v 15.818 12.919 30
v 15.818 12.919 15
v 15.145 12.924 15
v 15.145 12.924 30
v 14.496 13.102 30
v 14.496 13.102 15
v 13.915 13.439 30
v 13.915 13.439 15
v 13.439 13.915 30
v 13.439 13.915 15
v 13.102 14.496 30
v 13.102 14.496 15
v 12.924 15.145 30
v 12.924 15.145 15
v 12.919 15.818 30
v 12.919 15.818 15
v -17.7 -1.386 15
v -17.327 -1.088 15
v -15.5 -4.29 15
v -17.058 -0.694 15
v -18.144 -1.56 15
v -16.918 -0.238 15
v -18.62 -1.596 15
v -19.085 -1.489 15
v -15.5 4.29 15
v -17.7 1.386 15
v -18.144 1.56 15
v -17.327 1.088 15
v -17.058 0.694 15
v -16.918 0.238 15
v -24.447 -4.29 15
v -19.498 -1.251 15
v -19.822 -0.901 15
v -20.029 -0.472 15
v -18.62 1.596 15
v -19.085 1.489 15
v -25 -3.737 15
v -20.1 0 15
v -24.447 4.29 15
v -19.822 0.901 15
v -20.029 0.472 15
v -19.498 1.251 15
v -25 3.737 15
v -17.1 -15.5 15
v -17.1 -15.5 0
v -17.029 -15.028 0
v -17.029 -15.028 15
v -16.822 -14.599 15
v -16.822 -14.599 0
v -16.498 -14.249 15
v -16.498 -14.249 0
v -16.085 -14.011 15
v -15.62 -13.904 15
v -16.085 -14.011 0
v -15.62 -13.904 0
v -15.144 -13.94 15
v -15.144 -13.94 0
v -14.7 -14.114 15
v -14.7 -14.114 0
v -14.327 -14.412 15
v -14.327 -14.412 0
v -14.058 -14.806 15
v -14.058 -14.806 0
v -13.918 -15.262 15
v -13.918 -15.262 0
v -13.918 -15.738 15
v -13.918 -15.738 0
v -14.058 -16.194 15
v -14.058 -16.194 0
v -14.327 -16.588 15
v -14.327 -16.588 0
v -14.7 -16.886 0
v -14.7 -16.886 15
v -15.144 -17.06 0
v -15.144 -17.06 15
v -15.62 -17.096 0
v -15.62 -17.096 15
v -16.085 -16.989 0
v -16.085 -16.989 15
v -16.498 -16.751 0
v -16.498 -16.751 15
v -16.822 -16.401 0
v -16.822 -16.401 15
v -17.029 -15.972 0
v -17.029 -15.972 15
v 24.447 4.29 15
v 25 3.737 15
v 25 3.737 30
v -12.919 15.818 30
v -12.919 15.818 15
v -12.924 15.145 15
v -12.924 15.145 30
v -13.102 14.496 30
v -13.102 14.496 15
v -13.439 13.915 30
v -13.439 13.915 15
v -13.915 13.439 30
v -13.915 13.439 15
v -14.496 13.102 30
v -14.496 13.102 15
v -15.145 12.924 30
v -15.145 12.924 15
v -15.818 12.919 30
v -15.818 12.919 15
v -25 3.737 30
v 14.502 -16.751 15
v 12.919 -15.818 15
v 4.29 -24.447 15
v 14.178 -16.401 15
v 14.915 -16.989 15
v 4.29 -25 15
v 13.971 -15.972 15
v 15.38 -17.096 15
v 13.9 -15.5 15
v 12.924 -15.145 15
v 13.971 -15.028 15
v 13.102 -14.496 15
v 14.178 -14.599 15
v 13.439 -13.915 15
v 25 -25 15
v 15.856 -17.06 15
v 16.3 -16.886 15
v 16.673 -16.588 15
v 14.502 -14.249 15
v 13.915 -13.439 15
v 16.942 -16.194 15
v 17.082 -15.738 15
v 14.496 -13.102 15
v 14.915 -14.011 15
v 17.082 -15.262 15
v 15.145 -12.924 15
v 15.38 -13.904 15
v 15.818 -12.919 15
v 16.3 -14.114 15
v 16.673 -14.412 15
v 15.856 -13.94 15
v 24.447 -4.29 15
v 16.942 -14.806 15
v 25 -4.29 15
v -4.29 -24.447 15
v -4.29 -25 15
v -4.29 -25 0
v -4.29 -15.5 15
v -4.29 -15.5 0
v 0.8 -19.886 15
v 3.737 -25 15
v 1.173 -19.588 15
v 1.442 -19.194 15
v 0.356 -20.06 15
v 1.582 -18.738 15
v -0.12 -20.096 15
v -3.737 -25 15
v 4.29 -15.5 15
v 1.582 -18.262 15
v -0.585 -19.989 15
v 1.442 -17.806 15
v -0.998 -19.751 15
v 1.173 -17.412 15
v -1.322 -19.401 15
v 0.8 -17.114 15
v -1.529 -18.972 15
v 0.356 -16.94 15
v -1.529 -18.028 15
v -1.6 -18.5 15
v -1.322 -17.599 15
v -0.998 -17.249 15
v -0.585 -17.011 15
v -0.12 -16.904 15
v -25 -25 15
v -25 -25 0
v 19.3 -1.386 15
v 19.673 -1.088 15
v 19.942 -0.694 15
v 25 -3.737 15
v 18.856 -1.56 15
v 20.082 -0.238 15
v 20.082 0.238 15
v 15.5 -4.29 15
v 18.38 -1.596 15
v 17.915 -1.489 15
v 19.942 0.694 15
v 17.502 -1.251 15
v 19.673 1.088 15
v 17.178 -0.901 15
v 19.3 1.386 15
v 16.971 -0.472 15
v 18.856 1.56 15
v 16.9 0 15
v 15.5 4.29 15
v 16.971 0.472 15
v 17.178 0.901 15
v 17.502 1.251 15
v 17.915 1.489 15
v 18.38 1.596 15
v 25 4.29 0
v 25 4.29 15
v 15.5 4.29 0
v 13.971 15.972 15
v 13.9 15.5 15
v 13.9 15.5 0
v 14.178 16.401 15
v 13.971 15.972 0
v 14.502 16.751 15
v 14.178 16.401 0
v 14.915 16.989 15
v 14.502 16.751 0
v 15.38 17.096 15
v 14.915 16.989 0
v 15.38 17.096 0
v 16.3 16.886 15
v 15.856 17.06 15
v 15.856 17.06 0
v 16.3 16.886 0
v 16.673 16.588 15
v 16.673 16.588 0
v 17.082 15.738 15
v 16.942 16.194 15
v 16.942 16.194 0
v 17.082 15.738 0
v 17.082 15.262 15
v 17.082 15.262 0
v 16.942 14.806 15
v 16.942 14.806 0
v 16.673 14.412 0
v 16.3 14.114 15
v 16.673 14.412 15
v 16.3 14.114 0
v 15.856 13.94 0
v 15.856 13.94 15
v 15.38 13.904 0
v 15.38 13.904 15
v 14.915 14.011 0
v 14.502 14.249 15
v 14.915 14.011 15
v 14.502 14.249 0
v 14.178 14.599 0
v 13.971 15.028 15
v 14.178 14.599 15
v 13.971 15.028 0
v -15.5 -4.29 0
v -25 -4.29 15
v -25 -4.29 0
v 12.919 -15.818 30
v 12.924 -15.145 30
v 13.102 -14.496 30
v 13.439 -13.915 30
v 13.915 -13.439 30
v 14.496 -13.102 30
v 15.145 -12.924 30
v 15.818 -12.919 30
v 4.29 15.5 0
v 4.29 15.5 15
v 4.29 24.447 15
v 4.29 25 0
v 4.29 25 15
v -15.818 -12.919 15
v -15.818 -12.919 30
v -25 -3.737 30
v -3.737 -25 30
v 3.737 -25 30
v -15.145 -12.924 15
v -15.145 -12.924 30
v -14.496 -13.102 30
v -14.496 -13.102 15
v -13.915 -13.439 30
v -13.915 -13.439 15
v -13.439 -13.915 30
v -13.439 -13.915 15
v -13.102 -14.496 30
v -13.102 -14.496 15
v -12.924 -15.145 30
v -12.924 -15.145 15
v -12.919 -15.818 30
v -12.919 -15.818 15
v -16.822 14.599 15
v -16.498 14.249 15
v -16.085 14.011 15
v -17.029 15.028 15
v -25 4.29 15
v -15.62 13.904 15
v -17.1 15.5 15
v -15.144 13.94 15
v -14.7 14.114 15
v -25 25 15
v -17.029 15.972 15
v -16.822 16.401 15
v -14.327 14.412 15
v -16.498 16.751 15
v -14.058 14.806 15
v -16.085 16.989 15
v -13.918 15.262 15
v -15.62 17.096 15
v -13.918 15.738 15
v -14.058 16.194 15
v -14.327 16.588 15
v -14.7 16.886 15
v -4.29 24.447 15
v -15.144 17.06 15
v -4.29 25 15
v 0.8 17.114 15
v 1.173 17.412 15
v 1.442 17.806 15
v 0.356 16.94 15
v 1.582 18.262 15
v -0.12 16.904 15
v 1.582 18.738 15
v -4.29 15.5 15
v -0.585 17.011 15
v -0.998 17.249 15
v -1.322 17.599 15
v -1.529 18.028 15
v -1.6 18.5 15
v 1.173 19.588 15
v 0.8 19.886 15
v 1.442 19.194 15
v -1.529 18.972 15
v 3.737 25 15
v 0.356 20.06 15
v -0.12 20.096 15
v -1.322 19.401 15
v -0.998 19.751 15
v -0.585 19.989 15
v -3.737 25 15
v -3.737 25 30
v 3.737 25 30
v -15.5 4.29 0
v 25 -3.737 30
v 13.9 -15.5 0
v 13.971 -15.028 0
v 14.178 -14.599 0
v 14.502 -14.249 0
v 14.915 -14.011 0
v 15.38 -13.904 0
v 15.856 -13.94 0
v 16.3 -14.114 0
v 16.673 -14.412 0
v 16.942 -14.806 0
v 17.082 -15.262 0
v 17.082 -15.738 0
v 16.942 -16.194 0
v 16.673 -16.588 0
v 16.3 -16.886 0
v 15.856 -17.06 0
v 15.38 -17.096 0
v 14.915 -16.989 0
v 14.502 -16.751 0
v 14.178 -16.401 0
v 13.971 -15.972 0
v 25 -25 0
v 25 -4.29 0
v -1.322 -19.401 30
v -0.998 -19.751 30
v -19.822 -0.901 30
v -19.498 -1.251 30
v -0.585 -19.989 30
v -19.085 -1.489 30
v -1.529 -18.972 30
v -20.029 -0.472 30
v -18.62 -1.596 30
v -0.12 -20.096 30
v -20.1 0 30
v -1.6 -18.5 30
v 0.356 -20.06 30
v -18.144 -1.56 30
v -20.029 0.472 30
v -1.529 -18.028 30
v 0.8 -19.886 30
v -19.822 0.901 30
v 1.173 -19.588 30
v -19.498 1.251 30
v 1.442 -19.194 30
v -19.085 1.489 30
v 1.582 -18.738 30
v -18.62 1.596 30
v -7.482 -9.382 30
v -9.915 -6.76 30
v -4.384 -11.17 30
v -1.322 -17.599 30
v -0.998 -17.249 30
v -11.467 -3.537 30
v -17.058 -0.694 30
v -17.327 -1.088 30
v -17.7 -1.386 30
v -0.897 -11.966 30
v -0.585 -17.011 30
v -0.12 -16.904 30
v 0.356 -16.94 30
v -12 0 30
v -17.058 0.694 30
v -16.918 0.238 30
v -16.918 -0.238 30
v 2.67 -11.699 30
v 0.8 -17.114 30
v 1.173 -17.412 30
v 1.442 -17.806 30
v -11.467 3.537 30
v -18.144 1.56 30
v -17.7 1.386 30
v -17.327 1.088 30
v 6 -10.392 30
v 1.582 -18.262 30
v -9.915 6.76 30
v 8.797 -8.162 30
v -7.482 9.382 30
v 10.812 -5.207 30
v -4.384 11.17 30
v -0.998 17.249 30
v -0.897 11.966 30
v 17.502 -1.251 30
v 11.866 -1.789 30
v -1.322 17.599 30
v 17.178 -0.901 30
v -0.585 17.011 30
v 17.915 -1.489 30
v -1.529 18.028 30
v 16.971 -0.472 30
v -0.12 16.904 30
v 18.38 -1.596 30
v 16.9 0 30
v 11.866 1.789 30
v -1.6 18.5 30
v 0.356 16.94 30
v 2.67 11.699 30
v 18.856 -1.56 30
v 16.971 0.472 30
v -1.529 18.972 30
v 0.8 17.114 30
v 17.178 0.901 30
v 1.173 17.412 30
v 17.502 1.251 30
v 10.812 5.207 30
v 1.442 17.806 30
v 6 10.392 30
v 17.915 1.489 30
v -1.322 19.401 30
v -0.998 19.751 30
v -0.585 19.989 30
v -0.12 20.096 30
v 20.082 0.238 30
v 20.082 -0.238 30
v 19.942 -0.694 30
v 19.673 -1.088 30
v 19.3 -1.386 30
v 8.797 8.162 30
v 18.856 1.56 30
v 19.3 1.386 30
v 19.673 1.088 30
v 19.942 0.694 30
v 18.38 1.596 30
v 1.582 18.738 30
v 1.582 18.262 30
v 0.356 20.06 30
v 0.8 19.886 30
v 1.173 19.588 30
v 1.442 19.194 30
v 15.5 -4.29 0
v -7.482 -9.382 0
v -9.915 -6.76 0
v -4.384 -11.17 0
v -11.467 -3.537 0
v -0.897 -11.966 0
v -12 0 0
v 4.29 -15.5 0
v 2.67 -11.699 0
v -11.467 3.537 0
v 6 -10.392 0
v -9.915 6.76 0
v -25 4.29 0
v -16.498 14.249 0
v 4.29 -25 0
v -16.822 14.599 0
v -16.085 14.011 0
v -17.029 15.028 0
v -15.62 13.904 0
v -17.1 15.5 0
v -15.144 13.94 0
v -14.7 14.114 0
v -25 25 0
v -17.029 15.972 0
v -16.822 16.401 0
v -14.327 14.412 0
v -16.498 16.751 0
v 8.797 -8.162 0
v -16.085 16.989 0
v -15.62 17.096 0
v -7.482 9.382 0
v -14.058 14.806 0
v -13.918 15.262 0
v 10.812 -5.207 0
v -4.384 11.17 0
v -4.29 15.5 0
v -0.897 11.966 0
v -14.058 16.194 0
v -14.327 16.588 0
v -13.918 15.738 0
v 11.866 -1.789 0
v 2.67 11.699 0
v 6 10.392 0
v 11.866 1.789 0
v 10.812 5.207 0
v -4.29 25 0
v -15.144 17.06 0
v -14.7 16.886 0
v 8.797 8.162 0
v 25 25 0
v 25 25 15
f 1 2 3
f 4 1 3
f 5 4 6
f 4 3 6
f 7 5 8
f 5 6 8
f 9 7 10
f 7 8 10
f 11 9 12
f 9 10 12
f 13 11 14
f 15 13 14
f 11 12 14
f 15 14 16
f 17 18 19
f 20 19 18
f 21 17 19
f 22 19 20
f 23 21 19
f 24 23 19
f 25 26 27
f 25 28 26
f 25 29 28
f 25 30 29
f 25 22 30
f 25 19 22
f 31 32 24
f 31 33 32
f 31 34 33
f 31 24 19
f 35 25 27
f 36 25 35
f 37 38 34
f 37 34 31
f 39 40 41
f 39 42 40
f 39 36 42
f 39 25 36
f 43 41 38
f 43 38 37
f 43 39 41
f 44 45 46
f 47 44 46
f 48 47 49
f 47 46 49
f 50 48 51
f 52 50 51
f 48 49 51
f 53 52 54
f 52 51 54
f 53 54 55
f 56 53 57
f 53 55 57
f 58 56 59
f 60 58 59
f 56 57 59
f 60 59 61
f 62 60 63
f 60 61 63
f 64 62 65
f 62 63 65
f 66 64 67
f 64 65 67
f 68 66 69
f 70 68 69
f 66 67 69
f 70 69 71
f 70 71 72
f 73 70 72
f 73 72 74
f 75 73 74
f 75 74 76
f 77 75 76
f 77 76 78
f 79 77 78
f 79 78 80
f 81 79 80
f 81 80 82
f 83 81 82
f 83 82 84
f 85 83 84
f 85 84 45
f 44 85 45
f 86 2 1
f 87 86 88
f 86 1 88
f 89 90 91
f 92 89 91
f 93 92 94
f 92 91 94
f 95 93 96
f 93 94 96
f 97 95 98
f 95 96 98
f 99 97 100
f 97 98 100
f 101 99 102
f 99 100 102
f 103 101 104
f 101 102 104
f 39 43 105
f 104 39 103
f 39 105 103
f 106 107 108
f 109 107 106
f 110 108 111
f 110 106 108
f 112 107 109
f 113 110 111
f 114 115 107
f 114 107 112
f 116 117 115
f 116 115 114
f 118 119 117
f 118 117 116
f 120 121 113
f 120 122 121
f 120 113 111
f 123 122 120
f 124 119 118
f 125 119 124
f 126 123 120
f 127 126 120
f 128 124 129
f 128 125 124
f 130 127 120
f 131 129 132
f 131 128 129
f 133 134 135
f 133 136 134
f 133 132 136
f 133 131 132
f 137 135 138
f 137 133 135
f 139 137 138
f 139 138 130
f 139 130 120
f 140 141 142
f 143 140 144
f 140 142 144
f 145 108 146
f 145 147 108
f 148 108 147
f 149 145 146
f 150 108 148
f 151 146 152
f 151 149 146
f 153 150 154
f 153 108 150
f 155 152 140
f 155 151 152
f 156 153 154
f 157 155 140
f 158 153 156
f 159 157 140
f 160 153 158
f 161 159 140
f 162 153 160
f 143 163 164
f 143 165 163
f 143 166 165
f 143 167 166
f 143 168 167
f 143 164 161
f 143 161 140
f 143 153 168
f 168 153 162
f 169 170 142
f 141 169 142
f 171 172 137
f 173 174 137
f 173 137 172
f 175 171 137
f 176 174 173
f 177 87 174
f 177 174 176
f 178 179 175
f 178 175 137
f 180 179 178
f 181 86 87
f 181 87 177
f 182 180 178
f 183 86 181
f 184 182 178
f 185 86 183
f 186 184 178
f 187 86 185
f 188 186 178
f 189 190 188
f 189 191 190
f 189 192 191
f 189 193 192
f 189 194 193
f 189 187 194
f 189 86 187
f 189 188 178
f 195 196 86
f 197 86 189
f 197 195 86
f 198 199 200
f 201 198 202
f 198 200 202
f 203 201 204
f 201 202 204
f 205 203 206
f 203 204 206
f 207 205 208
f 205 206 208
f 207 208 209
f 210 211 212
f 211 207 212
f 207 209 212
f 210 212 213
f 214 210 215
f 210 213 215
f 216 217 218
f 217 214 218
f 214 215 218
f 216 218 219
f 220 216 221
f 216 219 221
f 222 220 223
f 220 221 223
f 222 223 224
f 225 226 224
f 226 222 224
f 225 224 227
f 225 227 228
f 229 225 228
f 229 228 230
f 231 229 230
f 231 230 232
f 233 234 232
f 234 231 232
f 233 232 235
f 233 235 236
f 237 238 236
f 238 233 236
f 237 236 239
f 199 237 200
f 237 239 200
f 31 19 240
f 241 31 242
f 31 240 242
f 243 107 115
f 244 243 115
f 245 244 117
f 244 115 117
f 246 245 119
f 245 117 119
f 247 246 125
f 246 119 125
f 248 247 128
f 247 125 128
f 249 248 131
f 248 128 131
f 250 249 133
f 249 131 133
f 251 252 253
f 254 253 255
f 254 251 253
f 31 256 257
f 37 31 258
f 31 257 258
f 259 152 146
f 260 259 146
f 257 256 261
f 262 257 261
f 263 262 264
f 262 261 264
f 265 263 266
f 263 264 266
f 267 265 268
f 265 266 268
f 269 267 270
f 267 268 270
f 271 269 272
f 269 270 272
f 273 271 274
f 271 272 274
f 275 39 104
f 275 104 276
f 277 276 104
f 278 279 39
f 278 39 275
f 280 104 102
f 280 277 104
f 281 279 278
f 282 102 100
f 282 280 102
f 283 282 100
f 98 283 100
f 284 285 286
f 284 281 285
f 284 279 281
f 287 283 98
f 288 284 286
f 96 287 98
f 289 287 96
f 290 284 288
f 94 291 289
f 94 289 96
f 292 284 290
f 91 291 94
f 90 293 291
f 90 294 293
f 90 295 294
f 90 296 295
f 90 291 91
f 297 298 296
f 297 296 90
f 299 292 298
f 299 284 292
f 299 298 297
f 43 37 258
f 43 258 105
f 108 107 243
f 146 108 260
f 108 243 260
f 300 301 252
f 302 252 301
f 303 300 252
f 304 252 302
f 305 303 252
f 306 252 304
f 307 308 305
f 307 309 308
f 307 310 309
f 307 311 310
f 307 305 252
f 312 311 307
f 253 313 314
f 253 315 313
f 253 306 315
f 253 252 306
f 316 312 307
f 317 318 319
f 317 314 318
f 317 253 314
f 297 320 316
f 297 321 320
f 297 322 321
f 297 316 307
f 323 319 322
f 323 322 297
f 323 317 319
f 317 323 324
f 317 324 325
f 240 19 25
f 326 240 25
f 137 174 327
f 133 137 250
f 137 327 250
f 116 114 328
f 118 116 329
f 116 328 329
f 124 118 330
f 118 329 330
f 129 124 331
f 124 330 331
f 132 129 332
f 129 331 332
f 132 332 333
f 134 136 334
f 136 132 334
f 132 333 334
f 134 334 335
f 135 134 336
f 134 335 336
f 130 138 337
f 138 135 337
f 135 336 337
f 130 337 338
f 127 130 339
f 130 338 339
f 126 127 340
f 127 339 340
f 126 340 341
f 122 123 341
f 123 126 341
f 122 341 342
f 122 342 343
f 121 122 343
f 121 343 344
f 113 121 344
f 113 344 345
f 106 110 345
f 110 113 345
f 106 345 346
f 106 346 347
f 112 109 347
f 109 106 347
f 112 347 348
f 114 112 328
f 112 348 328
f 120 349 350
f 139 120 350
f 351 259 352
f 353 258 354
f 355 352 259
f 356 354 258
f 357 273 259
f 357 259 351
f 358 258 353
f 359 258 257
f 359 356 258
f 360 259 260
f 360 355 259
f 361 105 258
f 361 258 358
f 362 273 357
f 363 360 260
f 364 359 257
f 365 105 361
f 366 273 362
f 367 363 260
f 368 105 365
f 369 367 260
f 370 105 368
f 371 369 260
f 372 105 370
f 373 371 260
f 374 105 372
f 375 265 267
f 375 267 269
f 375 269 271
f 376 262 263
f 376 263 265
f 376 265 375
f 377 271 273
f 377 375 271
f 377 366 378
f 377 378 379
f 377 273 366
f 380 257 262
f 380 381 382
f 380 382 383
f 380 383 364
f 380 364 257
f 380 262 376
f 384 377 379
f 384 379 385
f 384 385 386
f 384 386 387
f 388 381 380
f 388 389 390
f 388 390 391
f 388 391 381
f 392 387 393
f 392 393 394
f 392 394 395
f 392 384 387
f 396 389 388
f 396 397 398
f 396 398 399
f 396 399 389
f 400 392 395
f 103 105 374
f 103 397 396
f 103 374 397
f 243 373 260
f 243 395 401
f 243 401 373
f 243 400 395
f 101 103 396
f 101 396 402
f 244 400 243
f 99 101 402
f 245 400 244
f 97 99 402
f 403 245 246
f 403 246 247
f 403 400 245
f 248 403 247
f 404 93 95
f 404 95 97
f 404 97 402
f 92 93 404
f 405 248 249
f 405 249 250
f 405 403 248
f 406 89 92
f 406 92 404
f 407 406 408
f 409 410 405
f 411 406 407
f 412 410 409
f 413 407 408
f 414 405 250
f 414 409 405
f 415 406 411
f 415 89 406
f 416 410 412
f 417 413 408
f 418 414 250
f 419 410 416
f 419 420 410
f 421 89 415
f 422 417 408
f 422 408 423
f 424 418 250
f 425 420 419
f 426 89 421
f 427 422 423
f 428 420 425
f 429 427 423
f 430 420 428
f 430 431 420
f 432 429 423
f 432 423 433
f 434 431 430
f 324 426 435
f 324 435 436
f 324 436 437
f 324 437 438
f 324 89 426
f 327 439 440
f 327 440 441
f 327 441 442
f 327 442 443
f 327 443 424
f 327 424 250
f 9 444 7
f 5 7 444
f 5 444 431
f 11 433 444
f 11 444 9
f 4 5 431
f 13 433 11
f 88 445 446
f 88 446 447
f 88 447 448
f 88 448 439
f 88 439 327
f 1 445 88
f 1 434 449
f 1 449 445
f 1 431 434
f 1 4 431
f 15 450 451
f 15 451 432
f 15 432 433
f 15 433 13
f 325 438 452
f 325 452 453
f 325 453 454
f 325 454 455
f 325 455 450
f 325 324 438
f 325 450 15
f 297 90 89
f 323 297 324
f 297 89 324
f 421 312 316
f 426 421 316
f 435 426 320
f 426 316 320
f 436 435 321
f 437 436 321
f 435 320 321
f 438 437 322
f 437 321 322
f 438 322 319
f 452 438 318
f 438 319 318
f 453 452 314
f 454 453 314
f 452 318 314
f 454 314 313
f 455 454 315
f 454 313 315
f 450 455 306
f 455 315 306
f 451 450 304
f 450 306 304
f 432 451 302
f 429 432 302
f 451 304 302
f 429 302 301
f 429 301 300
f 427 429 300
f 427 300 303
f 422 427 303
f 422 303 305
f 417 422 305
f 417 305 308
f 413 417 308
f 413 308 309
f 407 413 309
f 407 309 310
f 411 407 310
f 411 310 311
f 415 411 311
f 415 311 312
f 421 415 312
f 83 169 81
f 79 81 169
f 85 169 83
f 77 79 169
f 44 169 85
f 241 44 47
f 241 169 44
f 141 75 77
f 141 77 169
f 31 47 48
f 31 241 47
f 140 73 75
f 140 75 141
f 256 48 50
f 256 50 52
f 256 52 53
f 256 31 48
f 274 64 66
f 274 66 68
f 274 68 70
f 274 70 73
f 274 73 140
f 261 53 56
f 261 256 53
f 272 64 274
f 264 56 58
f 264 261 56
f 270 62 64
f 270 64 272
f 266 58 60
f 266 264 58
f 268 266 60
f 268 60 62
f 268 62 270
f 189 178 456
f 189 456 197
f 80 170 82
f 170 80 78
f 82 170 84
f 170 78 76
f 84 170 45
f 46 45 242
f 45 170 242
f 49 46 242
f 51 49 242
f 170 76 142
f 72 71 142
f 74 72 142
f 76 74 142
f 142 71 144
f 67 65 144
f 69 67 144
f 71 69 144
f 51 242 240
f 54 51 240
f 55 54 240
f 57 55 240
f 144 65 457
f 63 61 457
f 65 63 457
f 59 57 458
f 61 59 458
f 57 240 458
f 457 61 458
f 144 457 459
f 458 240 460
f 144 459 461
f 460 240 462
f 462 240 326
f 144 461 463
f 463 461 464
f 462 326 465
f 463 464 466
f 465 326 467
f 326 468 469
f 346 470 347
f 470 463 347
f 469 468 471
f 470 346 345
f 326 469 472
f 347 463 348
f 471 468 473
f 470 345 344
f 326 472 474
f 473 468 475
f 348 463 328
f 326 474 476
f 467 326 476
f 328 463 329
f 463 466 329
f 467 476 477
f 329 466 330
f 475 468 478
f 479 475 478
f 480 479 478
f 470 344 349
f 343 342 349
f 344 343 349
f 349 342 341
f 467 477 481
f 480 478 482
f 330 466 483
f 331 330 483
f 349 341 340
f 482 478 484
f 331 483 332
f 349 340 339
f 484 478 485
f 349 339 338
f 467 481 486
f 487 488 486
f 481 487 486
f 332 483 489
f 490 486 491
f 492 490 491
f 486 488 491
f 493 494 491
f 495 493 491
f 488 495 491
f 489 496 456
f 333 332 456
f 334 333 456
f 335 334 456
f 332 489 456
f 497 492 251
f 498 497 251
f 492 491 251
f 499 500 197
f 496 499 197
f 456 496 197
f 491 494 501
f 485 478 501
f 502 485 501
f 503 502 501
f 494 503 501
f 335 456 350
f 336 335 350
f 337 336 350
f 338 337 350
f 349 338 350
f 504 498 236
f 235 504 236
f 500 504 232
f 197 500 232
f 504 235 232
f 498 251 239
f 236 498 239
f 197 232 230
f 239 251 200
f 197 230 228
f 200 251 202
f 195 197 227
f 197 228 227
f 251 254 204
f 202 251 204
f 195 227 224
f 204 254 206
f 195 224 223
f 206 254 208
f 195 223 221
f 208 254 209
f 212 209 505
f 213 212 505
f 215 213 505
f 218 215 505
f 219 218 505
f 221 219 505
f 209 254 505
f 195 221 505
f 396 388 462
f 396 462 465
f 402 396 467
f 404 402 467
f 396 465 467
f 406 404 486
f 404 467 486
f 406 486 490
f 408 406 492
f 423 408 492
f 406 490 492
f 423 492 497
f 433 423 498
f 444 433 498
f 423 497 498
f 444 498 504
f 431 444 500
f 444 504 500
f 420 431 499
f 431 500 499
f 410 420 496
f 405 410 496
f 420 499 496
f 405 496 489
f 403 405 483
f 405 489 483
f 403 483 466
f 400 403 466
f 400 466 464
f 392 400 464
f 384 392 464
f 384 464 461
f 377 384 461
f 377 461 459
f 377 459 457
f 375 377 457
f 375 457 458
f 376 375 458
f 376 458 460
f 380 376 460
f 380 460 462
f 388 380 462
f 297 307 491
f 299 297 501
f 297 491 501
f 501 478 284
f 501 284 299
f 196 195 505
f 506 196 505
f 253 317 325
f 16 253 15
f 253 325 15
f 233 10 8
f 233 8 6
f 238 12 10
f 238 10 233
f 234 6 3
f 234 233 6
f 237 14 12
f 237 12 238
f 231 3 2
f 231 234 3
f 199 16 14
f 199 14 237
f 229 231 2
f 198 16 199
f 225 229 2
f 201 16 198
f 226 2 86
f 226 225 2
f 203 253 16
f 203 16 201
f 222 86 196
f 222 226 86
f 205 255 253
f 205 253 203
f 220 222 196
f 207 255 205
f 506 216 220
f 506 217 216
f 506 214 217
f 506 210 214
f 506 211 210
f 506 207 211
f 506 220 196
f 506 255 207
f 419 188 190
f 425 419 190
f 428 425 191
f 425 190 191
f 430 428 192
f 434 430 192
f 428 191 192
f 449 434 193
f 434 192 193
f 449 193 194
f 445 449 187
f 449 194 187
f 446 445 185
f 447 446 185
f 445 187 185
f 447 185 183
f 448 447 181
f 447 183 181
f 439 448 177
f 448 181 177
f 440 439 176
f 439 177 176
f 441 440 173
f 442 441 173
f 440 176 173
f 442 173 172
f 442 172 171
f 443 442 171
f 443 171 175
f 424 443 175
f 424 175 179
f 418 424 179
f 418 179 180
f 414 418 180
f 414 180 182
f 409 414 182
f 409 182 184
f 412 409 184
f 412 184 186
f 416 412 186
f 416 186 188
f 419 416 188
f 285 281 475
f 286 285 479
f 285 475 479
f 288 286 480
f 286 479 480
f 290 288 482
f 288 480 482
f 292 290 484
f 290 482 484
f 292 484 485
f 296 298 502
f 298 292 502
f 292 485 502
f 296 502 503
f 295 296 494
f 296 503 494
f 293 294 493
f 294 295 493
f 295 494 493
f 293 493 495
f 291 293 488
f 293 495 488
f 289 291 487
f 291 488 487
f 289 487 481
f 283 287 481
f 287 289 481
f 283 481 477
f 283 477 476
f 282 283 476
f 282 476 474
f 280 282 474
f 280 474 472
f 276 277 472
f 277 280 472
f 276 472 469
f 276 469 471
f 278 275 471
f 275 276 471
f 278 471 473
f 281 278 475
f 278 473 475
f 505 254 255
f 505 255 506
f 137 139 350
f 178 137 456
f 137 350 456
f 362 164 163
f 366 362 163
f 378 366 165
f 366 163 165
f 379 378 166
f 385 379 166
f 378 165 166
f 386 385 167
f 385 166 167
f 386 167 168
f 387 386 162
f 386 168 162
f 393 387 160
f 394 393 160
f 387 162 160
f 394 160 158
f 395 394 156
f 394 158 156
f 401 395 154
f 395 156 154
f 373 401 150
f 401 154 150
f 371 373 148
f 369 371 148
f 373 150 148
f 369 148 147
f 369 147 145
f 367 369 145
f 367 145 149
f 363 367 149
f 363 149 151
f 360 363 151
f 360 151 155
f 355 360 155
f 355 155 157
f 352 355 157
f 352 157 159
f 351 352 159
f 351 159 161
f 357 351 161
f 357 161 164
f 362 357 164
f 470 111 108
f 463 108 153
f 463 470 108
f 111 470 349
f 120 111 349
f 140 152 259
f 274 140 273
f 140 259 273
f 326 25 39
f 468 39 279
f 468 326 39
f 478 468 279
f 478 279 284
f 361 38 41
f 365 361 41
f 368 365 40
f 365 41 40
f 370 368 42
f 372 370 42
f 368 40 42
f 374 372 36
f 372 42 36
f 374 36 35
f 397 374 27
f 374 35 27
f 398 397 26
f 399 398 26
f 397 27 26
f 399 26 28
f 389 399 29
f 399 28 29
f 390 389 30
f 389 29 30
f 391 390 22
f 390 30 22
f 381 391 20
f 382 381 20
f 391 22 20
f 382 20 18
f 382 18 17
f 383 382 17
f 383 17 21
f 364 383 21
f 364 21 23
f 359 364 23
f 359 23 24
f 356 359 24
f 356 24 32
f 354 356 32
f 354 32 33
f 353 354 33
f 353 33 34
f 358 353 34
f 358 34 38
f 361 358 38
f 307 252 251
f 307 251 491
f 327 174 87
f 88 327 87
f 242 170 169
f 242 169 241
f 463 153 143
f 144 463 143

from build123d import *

# Parameters (mm, degrees)
SKETCH_1_W          = 50
SKETCH_1_H          = 50
EXTRUDE_1_DEPTH     = 30
HOLE_WIZARD_348_D   = 24
HOLE_WIZARD_1_D     = 3.2
HOLE_WIZARD_2_D     = 3.2
CUT_EXTRUDE_1_DEPTH = 15
SKETCH_16_W         = 8.580132312
SKETCH_16_H         = 9.5
SKETCH_16_W_2       = 9.5
SKETCH_16_H_2       = 8.580132312
CUT_EXTRUDE_3_DEPTH = 15
HOLE_WIZARD_3_D     = 5.2
HOLE_WIZARD_3_DEPTH = 15


with BuildPart() as part:
    # 草图1 → 凸台-拉伸1 (new body)
    with BuildSketch(Plane.XY):
        Rectangle(SKETCH_1_W, SKETCH_1_H)
    extrude(amount=EXTRUDE_1_DEPTH)

    # Hole Wizard 348 (through all)
    with Locations(Plane.XY.offset(30)):
        with Locations((0, 0)):
            Hole(HOLE_WIZARD_348_D / 2)

    # 孔1 (through all)
    with Locations(Plane.XY.offset(30)):
        with Locations((-15.5, 15.5), (15.5, 15.5), (15.5, -15.5), (-15.5, -15.5)):
            Hole(HOLE_WIZARD_1_D / 2)

    # 孔2 (through all)
    with Locations(Plane.XY.offset(30)):
        with Locations((0, 18.5), (18.5, 0), (0, -18.5), (-18.5, 0)):
            Hole(HOLE_WIZARD_2_D / 2)

    # 草图13 → 切除-拉伸-薄壁1 (cut)
    with BuildSketch(Plane.XY.offset(30)):
        Polygon((-25, 3.7372583), (-14.36862915, 14.36862915), (-3.7372583, 25), (-17.879393924, 39.142135624), (-28.510764774, 28.510764774), (-39.142135624, 17.879393924), align=None)
        Polygon((3.7372583, 25), (14.36862915, 14.36862915), (25, 3.7372583), (39.142135624, 17.879393924), (28.510764774, 28.510764774), (17.879393924, 39.142135624), align=None)
        Polygon((-3.7372583, -25), (-14.36862915, -14.36862915), (-25, -3.7372583), (-39.142135624, -17.879393924), (-28.510764774, -28.510764774), (-17.879393924, -39.142135624), align=None)
        Polygon((25, -3.7372583), (14.36862915, -14.36862915), (3.7372583, -25), (17.879393924, -39.142135624), (28.510764774, -28.510764774), (39.142135624, -17.879393924), align=None)
    extrude(amount=-CUT_EXTRUDE_1_DEPTH, mode=Mode.SUBTRACT)

    # 草图16 → 切除-拉伸3 (cut)
    with BuildSketch(Plane(origin=(0, 0, 0), x_dir=(-1, 0, 0), z_dir=(0, 0, -1))):
        with Locations((0, 20.25)):
            Rectangle(SKETCH_16_W, SKETCH_16_H)
        with Locations((0, -20.25)):
            Rectangle(SKETCH_16_W, SKETCH_16_H)
        with Locations((-20.25, 0)):
            Rectangle(SKETCH_16_W_2, SKETCH_16_H_2)
        with Locations((20.25, 0)):
            Rectangle(SKETCH_16_W_2, SKETCH_16_H_2)
    extrude(amount=-CUT_EXTRUDE_3_DEPTH, mode=Mode.SUBTRACT)

    # 孔3
    with Locations(Plane.XY.offset(30)):
        with Locations((-15.5, 15.5), (15.5, 15.5), (15.5, -15.5), (-15.5, -15.5)):
            Hole(HOLE_WIZARD_3_D / 2, depth=HOLE_WIZARD_3_DEPTH)


solid = part.part
